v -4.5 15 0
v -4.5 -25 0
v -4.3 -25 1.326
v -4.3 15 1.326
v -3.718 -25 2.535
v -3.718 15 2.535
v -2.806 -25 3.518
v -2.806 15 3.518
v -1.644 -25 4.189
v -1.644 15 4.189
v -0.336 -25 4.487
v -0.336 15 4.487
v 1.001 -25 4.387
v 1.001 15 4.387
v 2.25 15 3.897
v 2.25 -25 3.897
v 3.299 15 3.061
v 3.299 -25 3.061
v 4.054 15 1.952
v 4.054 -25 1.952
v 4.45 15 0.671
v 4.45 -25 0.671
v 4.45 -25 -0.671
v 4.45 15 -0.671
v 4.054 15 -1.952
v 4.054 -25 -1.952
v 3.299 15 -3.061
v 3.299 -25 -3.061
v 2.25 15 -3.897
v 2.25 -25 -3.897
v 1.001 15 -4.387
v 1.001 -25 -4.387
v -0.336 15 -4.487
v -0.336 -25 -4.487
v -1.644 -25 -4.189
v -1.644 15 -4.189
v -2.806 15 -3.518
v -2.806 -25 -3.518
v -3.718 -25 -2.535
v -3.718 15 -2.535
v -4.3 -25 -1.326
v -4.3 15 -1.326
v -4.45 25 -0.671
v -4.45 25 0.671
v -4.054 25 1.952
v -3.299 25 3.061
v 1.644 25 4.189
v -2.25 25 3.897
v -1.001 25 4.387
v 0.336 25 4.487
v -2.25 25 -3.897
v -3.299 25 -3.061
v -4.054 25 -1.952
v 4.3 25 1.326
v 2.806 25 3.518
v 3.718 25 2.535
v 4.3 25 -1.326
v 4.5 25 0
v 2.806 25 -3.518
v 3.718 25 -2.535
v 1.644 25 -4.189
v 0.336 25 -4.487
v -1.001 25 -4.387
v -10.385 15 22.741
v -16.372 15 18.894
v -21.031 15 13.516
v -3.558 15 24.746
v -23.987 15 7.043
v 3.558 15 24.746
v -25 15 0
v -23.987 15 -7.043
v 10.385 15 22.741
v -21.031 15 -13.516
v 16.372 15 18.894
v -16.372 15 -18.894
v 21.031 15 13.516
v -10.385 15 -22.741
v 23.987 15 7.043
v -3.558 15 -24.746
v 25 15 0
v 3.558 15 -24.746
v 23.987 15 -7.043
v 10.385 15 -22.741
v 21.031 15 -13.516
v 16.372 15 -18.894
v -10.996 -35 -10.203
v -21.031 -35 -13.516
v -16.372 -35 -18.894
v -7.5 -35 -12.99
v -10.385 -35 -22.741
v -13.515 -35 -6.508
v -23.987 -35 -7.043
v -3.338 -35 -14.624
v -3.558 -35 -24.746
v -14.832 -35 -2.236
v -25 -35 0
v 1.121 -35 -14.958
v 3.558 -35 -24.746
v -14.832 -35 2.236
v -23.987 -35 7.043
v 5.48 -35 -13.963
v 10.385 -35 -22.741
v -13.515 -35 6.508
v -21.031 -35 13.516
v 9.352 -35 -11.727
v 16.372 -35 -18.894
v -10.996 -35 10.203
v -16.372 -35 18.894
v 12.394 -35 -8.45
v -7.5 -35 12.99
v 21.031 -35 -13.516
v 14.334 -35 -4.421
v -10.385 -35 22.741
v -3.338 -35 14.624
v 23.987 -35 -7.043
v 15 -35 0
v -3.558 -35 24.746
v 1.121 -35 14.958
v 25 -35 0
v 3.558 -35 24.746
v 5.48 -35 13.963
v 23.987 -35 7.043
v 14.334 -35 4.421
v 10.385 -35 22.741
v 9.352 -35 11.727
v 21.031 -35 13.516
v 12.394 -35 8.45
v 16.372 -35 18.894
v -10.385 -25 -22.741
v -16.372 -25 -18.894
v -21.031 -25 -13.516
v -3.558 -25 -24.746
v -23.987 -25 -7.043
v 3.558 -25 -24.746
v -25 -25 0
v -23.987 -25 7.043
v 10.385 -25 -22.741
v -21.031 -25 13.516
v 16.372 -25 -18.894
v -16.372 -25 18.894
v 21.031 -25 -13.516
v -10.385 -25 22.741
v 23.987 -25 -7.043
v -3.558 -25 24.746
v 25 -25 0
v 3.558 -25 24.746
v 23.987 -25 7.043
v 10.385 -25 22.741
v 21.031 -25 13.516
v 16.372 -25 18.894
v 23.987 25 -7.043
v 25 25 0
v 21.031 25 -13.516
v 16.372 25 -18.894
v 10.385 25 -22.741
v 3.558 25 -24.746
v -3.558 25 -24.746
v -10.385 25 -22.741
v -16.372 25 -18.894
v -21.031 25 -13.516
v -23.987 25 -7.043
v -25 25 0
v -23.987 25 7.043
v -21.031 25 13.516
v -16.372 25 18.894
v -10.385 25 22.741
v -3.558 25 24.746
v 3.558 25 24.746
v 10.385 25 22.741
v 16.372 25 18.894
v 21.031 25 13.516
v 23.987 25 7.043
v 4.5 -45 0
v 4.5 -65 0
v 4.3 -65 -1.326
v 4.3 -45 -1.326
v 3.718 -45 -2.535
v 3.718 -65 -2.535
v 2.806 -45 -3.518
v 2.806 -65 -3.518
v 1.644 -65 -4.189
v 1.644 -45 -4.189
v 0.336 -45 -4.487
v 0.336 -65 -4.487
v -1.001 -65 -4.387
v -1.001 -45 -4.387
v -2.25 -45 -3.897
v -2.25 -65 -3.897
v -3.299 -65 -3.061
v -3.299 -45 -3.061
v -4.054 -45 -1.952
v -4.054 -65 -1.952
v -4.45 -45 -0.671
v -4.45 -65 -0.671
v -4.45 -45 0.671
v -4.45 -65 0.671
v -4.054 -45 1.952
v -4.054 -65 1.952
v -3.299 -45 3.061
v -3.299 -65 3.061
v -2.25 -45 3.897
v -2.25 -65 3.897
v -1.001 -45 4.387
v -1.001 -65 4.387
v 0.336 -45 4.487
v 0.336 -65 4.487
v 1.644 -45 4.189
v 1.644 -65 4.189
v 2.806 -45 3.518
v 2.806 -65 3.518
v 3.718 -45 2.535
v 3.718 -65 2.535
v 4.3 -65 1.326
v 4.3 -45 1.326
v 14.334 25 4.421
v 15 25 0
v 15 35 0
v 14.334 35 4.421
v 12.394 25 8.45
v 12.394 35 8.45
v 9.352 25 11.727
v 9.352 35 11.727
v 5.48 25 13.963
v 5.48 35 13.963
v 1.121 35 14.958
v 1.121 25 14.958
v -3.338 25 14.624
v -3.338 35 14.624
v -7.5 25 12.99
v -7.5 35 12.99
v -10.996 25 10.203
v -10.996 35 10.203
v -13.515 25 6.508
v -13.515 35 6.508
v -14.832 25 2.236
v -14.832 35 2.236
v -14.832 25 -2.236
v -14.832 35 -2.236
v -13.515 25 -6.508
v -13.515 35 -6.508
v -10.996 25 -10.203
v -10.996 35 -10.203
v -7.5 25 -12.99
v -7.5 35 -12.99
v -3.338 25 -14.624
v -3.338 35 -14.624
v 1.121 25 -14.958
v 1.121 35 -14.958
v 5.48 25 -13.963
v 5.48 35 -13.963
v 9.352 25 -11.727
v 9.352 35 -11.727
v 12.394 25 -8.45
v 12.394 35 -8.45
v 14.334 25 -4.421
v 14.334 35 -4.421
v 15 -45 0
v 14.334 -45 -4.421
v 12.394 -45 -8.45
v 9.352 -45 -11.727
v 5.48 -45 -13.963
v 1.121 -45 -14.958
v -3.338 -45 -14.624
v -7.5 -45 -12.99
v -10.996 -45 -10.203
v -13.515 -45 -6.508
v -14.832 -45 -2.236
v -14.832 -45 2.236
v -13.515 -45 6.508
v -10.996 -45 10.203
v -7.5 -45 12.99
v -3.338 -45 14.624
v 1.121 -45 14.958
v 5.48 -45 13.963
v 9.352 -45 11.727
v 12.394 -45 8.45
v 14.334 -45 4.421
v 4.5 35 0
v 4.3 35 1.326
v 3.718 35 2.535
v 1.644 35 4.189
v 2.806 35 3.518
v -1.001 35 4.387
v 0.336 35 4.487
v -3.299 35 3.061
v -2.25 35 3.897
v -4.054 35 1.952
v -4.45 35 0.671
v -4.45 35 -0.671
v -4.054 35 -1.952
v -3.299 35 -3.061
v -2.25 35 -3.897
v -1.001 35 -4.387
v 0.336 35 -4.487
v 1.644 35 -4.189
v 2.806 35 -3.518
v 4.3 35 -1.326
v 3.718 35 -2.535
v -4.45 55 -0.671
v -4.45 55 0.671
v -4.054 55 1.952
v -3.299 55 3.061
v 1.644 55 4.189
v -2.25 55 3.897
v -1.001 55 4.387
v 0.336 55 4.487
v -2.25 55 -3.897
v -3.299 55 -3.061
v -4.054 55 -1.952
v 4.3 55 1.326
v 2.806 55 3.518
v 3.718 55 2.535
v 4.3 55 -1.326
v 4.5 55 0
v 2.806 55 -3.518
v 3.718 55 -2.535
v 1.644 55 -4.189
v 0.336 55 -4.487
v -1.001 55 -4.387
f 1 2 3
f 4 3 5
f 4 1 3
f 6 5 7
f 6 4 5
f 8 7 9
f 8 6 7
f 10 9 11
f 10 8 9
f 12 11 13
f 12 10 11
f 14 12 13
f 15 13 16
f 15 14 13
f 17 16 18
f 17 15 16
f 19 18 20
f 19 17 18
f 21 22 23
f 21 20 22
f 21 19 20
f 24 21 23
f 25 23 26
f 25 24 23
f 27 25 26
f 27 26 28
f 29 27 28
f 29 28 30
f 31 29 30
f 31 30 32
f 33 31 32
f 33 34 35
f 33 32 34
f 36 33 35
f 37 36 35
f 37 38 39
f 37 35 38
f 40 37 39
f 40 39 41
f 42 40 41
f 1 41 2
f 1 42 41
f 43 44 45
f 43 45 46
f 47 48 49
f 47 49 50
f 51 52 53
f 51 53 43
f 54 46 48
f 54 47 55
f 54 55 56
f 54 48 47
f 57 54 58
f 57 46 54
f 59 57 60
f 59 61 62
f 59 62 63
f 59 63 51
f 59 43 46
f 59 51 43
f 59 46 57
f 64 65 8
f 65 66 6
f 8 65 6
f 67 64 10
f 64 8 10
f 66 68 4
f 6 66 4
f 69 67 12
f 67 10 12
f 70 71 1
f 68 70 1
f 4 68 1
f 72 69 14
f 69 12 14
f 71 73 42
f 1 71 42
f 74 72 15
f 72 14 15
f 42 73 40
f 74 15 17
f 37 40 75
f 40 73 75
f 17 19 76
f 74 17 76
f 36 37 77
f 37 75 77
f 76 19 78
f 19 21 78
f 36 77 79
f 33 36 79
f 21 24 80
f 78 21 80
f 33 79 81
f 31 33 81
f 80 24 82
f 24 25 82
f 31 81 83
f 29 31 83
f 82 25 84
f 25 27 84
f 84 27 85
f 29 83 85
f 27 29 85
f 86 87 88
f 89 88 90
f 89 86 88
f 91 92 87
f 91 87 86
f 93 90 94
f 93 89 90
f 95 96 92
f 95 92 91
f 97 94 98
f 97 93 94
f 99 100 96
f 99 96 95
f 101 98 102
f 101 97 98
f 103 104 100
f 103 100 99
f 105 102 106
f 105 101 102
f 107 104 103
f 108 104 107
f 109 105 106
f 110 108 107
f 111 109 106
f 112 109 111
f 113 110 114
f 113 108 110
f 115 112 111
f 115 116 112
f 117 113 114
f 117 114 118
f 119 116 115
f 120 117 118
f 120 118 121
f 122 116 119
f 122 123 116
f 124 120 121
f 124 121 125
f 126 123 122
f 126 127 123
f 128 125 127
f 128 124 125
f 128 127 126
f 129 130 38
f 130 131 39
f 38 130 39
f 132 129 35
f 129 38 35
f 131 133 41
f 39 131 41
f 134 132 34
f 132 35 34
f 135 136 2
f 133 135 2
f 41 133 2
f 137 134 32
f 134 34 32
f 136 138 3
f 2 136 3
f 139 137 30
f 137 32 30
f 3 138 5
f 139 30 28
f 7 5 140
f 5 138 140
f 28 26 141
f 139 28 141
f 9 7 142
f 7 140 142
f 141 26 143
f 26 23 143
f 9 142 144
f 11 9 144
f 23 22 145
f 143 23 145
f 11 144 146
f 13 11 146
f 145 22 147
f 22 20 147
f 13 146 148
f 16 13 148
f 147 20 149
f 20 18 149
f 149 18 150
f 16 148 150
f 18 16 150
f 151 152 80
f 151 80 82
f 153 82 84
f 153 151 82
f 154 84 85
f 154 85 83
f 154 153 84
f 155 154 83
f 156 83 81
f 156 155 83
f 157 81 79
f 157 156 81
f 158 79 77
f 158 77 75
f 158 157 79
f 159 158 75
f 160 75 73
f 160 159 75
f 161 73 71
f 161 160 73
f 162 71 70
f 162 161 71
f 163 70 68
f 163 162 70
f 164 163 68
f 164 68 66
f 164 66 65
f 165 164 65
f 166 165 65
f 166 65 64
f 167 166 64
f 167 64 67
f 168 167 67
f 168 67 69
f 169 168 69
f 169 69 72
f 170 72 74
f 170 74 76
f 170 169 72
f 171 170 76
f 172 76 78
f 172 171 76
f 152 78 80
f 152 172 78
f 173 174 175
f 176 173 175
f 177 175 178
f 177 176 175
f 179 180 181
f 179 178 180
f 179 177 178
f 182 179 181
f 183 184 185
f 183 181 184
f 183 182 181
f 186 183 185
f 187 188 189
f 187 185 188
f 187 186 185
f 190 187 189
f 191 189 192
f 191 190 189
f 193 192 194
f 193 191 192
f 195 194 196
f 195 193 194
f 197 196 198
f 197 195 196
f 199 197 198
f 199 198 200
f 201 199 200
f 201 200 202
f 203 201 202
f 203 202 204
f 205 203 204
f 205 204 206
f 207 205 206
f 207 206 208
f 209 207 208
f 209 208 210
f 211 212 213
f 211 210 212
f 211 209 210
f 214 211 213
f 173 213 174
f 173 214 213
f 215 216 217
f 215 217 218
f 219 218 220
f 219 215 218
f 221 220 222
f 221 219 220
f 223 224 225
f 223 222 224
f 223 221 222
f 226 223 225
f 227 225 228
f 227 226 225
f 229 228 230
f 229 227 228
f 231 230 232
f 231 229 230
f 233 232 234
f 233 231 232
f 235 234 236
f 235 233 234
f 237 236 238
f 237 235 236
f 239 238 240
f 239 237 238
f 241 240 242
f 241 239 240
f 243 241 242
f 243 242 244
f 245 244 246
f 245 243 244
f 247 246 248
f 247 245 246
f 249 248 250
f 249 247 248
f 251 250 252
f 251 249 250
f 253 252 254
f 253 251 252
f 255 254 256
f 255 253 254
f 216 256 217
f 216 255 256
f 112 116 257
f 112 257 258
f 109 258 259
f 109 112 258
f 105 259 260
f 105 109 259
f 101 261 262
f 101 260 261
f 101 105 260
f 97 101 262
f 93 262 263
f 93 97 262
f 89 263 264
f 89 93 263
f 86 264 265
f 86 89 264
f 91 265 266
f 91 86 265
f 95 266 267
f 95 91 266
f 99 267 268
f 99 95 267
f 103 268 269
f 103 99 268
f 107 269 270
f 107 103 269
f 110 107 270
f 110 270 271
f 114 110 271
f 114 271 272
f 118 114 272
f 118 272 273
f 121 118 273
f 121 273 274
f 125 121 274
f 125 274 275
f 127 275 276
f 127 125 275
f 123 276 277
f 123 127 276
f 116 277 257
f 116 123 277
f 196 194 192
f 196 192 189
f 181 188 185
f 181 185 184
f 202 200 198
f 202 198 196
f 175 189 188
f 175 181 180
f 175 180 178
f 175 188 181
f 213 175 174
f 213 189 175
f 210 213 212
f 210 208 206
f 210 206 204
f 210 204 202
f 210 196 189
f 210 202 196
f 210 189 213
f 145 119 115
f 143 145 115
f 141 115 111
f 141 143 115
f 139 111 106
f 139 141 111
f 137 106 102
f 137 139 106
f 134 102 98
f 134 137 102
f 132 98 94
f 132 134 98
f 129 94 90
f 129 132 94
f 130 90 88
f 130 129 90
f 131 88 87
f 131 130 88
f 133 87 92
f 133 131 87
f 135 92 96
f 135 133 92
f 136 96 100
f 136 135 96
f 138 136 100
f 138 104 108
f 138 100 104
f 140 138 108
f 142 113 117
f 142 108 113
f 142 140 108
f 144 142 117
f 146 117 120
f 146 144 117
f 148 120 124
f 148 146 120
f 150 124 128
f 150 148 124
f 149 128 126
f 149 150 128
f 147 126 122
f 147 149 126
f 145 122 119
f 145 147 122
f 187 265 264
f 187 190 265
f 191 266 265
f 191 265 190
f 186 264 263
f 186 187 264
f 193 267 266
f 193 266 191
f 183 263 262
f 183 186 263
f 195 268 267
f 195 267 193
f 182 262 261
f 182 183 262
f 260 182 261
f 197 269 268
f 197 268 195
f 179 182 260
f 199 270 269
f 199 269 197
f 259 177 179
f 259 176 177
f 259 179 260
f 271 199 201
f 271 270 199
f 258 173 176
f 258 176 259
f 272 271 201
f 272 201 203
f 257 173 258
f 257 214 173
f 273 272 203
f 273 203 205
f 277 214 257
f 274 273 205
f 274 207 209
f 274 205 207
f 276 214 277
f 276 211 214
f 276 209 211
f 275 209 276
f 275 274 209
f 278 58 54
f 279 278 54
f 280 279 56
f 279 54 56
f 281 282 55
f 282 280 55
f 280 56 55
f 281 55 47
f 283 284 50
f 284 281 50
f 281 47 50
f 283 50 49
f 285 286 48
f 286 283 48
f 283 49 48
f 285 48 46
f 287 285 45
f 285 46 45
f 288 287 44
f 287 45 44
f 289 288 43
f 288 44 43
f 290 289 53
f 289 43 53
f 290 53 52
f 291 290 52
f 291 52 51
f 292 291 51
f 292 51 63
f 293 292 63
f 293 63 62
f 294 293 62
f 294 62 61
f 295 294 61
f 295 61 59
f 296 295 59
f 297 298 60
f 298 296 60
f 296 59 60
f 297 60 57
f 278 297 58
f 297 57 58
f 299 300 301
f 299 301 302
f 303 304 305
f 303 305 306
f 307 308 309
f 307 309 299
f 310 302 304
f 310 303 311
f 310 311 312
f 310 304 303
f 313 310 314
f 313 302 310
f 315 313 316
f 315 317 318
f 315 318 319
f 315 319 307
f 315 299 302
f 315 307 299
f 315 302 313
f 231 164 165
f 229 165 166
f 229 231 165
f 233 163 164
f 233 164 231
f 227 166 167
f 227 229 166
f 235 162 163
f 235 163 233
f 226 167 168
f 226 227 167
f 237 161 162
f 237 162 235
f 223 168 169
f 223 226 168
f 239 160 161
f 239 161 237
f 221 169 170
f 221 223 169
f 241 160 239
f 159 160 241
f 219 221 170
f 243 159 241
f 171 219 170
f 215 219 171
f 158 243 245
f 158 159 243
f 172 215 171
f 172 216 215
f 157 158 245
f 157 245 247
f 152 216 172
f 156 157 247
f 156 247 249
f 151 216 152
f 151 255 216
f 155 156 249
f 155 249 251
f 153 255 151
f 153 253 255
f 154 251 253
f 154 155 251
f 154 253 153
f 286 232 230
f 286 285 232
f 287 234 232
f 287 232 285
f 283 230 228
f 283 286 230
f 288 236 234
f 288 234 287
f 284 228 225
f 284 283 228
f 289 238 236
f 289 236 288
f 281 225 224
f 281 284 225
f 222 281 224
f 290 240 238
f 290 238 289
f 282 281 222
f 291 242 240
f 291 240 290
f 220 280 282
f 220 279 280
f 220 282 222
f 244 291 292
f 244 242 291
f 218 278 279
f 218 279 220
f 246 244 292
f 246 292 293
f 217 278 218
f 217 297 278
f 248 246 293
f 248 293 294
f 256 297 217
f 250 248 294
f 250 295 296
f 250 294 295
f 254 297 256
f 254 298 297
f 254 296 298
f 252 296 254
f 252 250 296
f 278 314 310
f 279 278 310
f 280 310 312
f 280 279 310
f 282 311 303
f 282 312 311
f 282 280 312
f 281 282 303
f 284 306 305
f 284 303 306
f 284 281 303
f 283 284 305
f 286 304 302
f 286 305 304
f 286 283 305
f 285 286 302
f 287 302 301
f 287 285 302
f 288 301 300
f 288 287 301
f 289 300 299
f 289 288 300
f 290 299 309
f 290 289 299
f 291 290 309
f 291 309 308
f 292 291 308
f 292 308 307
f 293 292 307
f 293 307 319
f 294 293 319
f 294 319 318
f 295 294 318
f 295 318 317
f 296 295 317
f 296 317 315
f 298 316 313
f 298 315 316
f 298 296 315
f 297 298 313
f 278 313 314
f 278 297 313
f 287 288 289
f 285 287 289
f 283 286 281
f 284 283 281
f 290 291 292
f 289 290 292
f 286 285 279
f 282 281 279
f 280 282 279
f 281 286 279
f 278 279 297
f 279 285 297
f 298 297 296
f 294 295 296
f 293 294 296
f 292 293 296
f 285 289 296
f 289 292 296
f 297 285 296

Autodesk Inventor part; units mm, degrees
ref_plane "YZ Plane" through (0, 0, 0) normal (1, 0, 0) x (0, 1, 0)
ref_plane "XZ Plane" through (0, 0, 0) normal (0, 1, 0) x (-1, 0, 0)
ref_plane "XY Plane" through (0, 0, 0) normal (0, 0, 1) x (1, 0, 0)
sketch "Sketch1" plane through (0, 0, 0) normal (0, 1, 0) x (-1, 0, 0)
  circle A0 centre (0, 0) radius 4.5
  dimension "d0" = 9
extrude "Extrusion1" add sketch "Sketch1" along normal blind 25 and the other way blind 25
sketch "Sketch2" plane through (0, 25, 0) normal (0, 1, 0) x (1, 0, 0)
  circle A0 centre (0, 0) radius 4.5 projected
  circle A1 centre (0, 0) radius 25
  dimension "d5" = 50
extrude "Extrusion2" add sketch "Sketch2" against normal blind 10
sketch "Sketch3" plane through (0, 25, 0) normal (0, 1, 0) x (1, 0, 0)
  circle A0 centre (0, 0) radius 4.5 projected
  circle A1 centre (0, 0) radius 15
  dimension "d8" = 30
extrude "Extrusion3" add sketch "Sketch3" along normal blind 10
sketch "Sketch4" plane through (0, 35, 0) normal (0, 1, 0) x (1, 0, 0)
  circle A0 centre (0, 0) radius 4.5 projected
  circle A1 centre (0, 0) radius 5.5
extrude "Extrusion4" add sketch "Sketch4" along normal blind 20 contours A0
sketch "Sketch5" plane through (0, -25, 0) normal (0, -1, 0) x (1, 0, 0)
  circle A0 centre (0, 0) radius 15 projected
  circle A1 centre (0, 0) radius 25
  circle A2 centre (0, 0) radius 4.5 projected
  circle A3 centre (0, 0) radius 15
  dimension "d19" = 50
extrude "Extrusion5" add sketch "Sketch5" along normal blind 10 contours A1
extrude "Extrusion6" add sketch "Sketch5" along normal blind 20 contours A0
extrude "Extrusion7" add sketch "Sketch5" along normal blind 40 contours A2
properties part number "McCrea_cinka_walle"
